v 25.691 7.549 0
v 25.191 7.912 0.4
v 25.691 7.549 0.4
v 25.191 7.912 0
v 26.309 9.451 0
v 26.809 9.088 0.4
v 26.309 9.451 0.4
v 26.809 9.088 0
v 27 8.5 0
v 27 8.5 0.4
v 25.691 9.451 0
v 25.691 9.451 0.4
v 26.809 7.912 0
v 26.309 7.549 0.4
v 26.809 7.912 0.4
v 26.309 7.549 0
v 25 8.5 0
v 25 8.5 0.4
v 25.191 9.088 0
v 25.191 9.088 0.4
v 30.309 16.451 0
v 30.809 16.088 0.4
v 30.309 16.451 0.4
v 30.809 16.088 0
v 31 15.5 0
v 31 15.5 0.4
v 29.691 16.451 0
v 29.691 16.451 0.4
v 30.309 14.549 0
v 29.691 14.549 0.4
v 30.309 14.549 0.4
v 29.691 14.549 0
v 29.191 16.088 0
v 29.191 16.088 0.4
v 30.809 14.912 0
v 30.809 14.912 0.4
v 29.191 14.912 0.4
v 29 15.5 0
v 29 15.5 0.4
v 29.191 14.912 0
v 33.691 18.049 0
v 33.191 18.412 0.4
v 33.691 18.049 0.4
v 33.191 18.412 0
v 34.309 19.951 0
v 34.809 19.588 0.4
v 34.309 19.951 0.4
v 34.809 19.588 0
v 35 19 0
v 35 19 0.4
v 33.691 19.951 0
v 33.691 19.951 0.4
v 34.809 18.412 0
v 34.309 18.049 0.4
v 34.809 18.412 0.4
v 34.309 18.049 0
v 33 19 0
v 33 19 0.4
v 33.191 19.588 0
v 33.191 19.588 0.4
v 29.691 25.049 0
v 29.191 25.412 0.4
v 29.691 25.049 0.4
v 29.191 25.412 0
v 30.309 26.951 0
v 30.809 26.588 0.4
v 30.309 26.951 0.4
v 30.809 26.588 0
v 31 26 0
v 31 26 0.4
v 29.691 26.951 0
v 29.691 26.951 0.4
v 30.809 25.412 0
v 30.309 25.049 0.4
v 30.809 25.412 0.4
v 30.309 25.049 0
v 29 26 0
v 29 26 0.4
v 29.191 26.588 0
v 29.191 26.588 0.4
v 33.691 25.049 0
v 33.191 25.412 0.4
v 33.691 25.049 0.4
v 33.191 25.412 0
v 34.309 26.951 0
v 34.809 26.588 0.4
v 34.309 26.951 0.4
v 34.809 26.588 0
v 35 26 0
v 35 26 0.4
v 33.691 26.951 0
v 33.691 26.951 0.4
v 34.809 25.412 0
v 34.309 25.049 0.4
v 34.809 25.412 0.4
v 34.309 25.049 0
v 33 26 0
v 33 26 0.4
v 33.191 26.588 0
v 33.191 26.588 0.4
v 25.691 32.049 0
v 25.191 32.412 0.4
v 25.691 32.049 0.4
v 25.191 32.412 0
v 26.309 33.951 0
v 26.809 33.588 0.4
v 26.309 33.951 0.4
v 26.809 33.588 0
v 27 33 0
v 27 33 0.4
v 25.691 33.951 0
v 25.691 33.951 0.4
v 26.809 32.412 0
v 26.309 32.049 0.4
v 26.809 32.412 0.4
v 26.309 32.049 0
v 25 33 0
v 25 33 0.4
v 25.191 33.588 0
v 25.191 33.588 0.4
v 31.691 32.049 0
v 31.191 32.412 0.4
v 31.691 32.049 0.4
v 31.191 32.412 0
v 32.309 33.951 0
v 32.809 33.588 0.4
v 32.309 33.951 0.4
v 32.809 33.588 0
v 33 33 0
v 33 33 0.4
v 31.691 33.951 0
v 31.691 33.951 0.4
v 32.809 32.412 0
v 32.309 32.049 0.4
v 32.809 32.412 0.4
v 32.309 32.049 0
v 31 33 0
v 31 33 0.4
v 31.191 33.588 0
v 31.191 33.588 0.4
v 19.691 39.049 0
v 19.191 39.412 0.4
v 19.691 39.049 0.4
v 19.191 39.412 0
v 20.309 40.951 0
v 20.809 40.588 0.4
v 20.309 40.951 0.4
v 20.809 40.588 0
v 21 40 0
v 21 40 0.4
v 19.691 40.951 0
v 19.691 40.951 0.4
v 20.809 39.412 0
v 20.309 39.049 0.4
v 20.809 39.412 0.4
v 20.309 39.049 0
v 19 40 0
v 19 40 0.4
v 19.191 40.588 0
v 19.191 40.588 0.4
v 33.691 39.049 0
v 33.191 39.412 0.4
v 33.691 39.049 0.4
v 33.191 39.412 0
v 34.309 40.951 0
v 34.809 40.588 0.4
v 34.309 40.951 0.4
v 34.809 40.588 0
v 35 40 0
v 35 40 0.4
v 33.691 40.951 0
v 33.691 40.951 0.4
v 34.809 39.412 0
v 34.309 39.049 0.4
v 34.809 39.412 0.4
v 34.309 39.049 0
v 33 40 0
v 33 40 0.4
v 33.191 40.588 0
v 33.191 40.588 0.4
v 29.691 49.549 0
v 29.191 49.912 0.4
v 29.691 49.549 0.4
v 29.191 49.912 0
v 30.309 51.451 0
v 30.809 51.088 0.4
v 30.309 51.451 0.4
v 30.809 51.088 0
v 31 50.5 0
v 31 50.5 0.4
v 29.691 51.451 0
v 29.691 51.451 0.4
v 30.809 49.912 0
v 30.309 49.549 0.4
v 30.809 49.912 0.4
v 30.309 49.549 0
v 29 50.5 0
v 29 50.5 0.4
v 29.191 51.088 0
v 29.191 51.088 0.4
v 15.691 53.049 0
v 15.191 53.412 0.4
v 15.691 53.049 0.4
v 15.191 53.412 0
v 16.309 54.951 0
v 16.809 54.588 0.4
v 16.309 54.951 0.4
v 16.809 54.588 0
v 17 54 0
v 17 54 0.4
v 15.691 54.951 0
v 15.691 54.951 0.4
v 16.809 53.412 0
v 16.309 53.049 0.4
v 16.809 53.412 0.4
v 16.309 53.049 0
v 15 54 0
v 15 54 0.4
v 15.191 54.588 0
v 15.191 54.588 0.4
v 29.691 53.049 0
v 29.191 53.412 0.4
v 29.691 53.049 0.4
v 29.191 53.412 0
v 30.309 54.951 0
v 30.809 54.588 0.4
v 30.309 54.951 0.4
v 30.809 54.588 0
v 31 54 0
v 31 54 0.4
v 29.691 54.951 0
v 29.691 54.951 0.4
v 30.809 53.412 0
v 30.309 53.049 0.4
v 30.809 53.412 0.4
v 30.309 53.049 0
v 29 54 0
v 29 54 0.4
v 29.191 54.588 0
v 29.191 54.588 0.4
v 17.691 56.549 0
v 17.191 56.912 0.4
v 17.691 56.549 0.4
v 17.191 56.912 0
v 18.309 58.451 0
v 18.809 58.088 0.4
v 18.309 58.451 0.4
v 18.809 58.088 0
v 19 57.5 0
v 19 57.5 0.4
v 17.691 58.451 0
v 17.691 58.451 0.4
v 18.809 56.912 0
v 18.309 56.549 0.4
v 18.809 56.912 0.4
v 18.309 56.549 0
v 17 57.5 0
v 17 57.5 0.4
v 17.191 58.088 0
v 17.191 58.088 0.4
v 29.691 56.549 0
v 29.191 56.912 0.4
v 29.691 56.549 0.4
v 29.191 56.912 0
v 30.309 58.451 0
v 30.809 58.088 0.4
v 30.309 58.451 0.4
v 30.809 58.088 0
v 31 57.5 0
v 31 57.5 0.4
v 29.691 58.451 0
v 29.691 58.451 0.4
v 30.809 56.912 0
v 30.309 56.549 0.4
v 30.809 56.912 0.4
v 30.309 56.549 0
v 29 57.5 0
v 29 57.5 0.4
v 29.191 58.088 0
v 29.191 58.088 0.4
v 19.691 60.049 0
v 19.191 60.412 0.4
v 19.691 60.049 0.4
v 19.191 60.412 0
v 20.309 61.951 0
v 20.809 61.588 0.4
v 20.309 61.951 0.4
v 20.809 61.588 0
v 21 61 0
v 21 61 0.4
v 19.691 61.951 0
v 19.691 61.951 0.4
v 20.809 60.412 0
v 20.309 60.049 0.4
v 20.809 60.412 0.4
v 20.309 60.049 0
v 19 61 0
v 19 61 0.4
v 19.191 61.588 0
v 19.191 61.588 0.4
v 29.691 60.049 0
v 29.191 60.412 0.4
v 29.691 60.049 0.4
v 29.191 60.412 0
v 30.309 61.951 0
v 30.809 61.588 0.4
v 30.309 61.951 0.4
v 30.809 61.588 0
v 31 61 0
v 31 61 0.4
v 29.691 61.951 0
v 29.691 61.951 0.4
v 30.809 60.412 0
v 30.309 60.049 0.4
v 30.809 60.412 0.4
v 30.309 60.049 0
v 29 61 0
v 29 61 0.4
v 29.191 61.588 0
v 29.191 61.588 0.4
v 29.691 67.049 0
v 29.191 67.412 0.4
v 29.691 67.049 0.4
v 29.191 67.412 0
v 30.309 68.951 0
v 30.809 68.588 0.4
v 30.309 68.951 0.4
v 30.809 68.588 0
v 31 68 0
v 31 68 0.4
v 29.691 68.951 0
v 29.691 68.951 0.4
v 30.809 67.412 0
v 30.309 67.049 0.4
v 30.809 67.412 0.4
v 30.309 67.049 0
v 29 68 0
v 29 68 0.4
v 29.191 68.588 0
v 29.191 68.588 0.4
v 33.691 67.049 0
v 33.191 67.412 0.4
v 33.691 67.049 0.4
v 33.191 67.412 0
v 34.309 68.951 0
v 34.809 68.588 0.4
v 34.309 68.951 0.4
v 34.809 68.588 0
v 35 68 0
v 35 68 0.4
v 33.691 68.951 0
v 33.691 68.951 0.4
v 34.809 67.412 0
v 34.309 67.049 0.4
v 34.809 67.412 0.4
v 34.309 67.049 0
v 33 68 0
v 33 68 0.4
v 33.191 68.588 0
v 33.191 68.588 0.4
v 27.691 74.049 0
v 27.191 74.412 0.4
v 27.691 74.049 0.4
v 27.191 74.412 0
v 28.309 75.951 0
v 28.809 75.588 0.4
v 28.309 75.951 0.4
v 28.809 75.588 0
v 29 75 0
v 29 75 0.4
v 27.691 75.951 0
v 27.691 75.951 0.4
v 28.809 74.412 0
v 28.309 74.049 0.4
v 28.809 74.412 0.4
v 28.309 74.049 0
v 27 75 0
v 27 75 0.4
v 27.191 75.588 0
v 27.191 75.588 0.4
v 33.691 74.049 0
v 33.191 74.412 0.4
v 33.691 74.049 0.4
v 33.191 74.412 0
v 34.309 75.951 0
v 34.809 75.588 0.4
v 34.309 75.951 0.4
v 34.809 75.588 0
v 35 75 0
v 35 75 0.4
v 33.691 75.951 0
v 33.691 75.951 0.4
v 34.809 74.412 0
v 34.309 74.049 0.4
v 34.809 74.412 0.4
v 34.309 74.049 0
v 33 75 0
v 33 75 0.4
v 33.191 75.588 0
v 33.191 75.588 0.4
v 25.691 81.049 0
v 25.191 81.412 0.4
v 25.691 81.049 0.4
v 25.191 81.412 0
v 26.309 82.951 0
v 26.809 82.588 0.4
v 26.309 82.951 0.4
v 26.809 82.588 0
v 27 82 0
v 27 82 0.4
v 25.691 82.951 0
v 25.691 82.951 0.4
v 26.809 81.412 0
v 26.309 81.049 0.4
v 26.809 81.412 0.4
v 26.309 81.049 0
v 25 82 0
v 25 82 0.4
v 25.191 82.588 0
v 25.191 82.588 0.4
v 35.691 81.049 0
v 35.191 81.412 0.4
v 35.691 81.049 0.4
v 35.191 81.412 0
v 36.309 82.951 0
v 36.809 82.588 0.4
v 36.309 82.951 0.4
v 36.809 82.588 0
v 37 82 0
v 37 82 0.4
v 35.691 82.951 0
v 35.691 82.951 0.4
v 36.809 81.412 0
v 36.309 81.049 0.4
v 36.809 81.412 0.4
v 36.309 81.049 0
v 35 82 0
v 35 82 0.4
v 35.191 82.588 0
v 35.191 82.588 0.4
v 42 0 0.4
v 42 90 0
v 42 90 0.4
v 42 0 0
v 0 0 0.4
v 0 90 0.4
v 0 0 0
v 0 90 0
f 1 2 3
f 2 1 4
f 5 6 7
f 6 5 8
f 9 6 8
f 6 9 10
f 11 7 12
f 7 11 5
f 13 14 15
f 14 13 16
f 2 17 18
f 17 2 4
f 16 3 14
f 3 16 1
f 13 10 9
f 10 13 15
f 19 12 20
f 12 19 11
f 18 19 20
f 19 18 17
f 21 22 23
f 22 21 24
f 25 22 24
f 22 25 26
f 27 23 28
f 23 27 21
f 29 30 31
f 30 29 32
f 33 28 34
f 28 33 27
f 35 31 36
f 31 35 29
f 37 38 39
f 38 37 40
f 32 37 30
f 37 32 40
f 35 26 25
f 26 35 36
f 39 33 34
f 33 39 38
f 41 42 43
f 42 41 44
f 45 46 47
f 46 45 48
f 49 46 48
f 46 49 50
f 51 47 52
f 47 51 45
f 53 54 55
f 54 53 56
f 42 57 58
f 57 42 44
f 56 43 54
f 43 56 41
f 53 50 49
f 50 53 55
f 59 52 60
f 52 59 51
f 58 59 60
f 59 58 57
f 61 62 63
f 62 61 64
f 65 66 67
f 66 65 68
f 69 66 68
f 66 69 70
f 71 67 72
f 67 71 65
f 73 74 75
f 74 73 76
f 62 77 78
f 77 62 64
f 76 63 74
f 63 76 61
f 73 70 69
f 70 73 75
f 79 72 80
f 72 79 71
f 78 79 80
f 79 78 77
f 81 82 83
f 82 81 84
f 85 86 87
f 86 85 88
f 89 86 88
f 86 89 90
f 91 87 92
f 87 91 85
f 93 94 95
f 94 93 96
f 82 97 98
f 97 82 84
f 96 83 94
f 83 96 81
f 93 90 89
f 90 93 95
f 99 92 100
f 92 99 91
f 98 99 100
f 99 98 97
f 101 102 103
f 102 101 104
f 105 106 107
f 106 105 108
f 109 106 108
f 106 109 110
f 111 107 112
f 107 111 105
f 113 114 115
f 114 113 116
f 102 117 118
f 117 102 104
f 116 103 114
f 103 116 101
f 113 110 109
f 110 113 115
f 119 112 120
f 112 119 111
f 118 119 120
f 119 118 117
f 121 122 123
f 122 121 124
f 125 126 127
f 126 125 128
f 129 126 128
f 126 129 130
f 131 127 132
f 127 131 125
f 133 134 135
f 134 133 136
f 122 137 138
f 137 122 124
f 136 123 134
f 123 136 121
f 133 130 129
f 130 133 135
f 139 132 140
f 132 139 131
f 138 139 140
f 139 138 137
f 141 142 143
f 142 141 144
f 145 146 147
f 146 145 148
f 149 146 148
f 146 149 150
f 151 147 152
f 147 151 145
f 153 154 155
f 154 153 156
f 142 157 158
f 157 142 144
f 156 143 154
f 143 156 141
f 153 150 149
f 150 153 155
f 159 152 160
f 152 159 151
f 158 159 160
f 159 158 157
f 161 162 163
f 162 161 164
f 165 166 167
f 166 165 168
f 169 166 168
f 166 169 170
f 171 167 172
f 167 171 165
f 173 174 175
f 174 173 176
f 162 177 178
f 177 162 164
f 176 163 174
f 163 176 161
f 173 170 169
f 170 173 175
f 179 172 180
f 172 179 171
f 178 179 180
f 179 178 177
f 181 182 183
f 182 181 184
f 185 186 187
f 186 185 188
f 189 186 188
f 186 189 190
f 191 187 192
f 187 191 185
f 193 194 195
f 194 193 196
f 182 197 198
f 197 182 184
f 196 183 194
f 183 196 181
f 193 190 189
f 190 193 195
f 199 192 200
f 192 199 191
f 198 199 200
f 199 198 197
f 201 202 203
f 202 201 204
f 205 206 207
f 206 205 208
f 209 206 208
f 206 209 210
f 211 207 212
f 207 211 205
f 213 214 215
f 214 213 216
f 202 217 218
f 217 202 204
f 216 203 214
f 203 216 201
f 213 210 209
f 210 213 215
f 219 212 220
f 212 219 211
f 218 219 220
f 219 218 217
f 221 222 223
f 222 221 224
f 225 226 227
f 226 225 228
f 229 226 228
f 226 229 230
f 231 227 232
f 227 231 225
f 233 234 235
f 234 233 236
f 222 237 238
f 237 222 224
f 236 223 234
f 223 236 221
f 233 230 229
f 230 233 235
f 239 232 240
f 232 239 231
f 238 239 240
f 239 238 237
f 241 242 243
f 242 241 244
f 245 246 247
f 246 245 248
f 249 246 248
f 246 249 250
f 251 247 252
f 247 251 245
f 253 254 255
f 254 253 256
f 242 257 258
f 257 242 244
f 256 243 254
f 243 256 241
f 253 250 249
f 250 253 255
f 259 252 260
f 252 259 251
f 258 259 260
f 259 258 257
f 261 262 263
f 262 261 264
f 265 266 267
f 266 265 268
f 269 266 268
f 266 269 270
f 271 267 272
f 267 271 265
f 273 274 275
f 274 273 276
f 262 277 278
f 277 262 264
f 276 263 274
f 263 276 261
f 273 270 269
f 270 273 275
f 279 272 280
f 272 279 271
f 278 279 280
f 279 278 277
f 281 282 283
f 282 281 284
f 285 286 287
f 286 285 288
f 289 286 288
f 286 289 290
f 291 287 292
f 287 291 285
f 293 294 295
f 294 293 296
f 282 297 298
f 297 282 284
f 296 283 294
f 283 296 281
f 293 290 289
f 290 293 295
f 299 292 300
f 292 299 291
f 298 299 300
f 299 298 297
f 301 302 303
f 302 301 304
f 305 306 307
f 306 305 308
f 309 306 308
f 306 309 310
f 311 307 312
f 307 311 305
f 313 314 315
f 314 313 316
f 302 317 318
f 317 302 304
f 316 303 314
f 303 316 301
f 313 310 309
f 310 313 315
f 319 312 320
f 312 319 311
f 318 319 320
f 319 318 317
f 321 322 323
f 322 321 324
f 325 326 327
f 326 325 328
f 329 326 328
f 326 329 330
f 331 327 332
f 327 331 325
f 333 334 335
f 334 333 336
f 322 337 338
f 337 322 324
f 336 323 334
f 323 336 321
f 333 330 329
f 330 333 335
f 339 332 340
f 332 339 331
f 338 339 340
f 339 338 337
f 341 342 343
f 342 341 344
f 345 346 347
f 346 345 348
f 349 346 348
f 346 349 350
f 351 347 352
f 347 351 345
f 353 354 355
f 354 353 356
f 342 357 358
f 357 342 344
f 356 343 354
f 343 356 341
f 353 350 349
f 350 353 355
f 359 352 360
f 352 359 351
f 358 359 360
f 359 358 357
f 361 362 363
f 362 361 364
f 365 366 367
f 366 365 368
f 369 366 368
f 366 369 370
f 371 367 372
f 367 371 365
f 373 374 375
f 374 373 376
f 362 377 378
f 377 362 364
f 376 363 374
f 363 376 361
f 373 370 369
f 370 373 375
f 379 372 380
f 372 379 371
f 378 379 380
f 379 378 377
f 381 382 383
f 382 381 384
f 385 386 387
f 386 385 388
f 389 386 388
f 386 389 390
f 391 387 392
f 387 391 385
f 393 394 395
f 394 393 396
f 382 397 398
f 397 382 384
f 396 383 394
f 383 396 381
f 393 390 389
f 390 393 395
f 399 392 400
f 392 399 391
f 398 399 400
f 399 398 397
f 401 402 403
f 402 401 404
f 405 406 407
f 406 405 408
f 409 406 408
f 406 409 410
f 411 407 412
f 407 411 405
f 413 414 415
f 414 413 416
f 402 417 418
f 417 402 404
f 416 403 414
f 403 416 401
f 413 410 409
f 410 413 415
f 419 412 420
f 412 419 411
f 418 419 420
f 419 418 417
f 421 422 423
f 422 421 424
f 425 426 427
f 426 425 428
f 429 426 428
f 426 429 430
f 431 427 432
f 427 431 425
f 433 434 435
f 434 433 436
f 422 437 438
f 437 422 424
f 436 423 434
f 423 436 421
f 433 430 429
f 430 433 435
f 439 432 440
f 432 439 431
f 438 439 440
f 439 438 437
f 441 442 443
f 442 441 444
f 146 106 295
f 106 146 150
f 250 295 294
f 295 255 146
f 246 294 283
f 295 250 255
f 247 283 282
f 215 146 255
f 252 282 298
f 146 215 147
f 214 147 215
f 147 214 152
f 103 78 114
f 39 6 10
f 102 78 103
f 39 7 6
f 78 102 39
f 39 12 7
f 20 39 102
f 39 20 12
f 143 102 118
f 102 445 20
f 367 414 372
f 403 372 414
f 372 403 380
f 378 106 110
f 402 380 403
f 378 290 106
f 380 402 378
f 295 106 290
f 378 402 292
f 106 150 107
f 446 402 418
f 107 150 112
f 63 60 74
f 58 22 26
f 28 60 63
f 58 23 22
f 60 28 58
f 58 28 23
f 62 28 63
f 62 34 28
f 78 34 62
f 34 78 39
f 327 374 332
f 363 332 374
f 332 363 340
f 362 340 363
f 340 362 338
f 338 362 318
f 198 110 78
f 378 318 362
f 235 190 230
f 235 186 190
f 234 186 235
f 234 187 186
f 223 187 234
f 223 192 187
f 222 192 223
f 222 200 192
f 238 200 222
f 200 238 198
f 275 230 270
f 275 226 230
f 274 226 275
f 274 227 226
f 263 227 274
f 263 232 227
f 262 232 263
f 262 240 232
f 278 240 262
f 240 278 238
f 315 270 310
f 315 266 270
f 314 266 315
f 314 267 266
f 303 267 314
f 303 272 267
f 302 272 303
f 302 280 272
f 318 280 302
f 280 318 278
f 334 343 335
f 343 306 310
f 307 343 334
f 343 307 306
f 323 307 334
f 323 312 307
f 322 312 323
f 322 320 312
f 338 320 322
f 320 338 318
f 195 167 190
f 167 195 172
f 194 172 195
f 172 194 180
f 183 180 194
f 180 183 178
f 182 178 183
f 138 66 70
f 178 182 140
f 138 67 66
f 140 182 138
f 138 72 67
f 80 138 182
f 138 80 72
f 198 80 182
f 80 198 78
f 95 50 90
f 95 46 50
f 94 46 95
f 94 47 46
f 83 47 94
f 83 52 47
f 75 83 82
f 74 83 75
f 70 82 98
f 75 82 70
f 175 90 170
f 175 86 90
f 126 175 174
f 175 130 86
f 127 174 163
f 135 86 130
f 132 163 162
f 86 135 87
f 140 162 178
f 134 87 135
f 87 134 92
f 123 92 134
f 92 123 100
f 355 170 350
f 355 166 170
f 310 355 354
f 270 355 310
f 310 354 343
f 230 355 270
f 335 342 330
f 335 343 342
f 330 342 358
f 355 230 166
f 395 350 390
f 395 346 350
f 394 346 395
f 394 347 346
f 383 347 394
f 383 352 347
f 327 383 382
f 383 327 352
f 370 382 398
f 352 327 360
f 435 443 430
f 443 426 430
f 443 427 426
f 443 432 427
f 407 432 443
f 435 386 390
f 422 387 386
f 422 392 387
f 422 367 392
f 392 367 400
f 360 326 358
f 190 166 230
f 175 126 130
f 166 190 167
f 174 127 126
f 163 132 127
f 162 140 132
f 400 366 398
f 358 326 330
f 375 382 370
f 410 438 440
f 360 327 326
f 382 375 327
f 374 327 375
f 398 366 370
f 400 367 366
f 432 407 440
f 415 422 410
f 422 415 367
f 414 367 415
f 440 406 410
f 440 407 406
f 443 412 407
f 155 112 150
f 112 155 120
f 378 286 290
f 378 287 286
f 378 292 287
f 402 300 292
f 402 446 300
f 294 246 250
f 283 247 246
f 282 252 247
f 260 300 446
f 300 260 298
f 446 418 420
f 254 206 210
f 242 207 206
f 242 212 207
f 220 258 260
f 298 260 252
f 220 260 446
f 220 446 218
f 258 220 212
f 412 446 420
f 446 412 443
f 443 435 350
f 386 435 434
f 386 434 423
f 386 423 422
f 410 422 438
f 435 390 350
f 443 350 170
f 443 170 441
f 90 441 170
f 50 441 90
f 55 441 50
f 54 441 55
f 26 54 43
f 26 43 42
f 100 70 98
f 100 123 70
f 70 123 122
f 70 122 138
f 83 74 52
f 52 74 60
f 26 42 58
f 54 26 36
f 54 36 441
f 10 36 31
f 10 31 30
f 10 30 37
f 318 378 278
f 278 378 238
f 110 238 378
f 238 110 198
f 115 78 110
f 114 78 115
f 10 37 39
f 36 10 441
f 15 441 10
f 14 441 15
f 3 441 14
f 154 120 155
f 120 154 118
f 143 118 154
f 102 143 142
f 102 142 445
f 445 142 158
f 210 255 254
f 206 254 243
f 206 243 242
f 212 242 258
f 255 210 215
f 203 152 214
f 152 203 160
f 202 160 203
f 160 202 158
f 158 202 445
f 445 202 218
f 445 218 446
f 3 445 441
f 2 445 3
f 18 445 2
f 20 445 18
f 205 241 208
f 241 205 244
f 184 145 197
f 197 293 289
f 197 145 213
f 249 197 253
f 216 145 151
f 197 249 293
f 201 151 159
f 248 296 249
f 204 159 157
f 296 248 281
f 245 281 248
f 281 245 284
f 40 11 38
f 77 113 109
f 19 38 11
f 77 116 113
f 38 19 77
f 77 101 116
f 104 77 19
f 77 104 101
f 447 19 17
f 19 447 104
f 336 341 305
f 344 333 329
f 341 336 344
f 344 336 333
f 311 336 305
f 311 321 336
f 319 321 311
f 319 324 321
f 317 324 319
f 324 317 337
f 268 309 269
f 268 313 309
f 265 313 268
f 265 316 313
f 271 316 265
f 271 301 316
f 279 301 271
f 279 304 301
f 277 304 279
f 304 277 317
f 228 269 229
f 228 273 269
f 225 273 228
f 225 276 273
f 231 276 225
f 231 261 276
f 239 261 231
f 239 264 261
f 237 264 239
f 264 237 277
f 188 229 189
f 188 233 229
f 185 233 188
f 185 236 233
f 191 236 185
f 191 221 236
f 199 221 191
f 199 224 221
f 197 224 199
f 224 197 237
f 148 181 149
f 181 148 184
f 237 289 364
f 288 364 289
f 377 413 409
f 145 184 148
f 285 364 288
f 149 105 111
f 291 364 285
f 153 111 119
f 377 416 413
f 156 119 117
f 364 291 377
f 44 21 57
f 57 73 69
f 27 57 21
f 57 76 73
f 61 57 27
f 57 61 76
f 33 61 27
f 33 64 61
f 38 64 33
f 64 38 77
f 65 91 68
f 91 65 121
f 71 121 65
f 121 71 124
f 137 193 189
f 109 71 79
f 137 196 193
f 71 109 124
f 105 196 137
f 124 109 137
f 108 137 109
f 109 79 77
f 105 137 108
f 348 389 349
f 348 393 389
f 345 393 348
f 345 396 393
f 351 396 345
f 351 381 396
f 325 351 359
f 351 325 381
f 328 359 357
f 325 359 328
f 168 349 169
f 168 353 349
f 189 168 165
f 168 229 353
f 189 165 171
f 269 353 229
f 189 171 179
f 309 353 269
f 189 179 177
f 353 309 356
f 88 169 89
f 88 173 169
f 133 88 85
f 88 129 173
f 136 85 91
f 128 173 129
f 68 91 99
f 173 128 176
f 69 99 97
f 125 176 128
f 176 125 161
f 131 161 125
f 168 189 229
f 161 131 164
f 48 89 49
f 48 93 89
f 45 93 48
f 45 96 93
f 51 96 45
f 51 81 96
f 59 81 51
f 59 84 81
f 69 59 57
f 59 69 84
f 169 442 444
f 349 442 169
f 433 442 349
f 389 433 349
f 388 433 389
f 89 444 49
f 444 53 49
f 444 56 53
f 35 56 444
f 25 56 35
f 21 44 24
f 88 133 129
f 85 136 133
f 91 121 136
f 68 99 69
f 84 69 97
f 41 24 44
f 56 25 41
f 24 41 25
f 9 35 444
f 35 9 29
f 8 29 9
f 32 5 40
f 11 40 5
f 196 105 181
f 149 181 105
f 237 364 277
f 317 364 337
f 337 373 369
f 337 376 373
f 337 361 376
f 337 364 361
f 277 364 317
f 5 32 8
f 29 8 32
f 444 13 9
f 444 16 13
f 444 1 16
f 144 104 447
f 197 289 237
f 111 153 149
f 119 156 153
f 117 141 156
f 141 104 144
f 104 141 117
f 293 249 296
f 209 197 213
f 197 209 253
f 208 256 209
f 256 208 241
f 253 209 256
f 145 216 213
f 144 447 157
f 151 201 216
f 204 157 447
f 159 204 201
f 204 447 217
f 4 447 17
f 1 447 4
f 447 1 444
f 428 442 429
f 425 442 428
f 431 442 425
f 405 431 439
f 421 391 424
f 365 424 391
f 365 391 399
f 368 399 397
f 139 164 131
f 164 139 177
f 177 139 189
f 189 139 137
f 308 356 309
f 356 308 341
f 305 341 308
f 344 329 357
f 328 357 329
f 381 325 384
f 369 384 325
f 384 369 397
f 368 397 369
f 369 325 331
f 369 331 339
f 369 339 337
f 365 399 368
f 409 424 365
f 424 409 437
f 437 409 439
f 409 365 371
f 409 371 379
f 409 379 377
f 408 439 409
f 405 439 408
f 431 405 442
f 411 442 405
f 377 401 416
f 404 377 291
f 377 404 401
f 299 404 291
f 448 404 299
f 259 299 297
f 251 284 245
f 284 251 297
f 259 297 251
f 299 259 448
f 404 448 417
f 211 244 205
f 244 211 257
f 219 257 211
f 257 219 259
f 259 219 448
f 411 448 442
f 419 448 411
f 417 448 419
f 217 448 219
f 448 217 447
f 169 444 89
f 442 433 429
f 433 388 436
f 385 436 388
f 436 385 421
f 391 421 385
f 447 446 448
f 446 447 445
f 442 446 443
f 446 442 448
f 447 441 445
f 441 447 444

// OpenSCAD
// [FL_INDEX: keywords="openscad, 3d_parametric, DIY_melody_strips_creator, csg_solid" | COT="Parametric OpenSCAD design from 3DCodeverse"]
// Title: DIY melody strips creator

$fn=10*1;  //More polygons

//Defines whether a pre-defined song or the NoteString shall be used.
SongPicker = "Star-Spangled Banner"; // [Note-String,Star-Spangled Banner]

//Defines where to set the holes for the notes. You have the notes c1 to c3. The first two characters define the note (c1,d1,e1...b1,c2,...c3), the last two characters define the beat. You have 50 beats to use. After every note-definition place a |. One c1 on the third beat would result in this NoteString: "c103|". Don't forget the | at the end!
NoteString = "c101|d102|e103|f104|g105|a106|b107|c208|d209|e210|f211|g212|a213|b214|c315|";

//The layer-thickness must not be more then 0.4mm. Otherwise it won't fit into the music box! Also try to print at least two layers - so slice it with a layer height of 0.2mm.
LayerThickness = 0.4;

//Defines the width of the stripe (in mm).
StripeWidth = 42; // [30:50]

//Defines the length of the stripe. 15 beats need a length around 60mm. The full 50 beats would need 200mm.
StripeLength = 90;// [10:200]

//For fine-tuning only: defines how far the c1 is away from the left stripe-border (in mm).
MarginLeft = 5; // [2:10]

//For fine-tuning only: defines the distance between the beats.
BeatDistance = 3.5;

//For fine-tuning only: defines the distance between the beats.
ToneDistance = 2;

Start( );

module Start()
{
NoteString_AmericanAnthem = "a101|f103|d104|f106|d106|a108|e108|d210|d110|f113|f214|f114|e215|f115|d216|f116|f118|d118|g120|d120|a122|c122|";

if( SongPicker == "Star-Spangled Banner")
	BuildStripe(NoteString_AmericanAnthem);
else if (SongPicker == "Note-String")
	BuildStripe(NoteString);
}

module BuildStripe(NoteStringLocal){
	takte=search("|",NoteStringLocal,1000)[0];
	difference()
	{
		BuildBase();
		for(i=[0:len(takte)-1])
		{
			printNote(str(NoteStringLocal[takte[i]-2],NoteStringLocal[takte[i]-1]), str(NoteStringLocal[takte[i]-4],NoteStringLocal[takte[i]-3]));
		}
	}
}

module printNote(takt,note)
{
	//I did not find a way to convert the string "01" into the number 1.
	//So there is this ugly convertion, I'm sorry. ;)
	if (takt == "01")
		printNote2(1,note);
	else if (takt == "02")
		printNote2(2,note);
	else if (takt == "03")
		printNote2(3,note);
	else if (takt == "04")
		printNote2(4,note);
	else if (takt == "05")
		printNote2(5,note);
	else if (takt == "06")
		printNote2(6,note);
	else if (takt == "07")
		printNote2(7,note);
	else if (takt == "08")
		printNote2(8,note);
	else if (takt == "09")
		printNote2(9,note);
	else if (takt == "10")
		printNote2(10,note);
	else if (takt == "11")
		printNote2(11,note);
	else if (takt == "12")
		printNote2(12,note);
	else if (takt == "13")
		printNote2(13,note);
	else if (takt == "14")
		printNote2(14,note);
	else if (takt == "15")
		printNote2(15,note);
	else if (takt == "16")
		printNote2(16,note);
	else if (takt == "17")
		printNote2(17,note);
	else if (takt == "18")
		printNote2(18,note);
	else if (takt == "19")
		printNote2(19,note);
	else if (takt == "20")
		printNote2(20,note);
	else if (takt == "21")
		printNote2(21,note);
	else if (takt == "22")
		printNote2(22,note);
	else if (takt == "23")
		printNote2(23,note);
	else if (takt == "24")
		printNote2(24,note);
	else if (takt == "25")
		printNote2(25,note);
	else if (takt == "26")
		printNote2(26,note);
	else if (takt == "27")
		printNote2(27,note);
	else if (takt == "28")
		printNote2(28,note);
	else if (takt == "29")
		printNote2(29,note);
	else if (takt == "30")
		printNote2(30,note);
	else if (takt == "31")
		printNote2(31,note);
	else if (takt == "32")
		printNote2(32,note);
	else if (takt == "33")
		printNote2(33,note);
	else if (takt == "34")
		printNote2(34,note);
	else if (takt == "35")
		printNote2(35,note);
	else if (takt == "36")
		printNote2(36,note);
	else if (takt == "37")
		printNote2(37,note);
	else if (takt == "38")
		printNote2(38,note);
	else if (takt == "39")
		printNote2(39,note);
	else if (takt == "40")
		printNote2(40,note);
	else if (takt == "41")
		printNote2(41,note);
	else if (takt == "42")
		printNote2(42,note);
	else if (takt == "43")
		printNote2(43,note);
	else if (takt == "44")
		printNote2(44,note);
	else if (takt == "45")
		printNote2(45,note);
	else if (takt == "46")
		printNote2(46,note);
	else if (takt == "47")
		printNote2(47,note);
	else if (takt == "48")
		printNote2(48,note);
	else if (takt == "49")
		printNote2(49,note);
	else if (takt == "50")
		printNote2(50,note);
	else
		printNote2(10,note);
}

module printNote2(takt,note)
{
	if (note == "c1")
		MakeHole(takt,1);
	else if (note == "d1")
		MakeHole(takt,2);
	else if (note == "e1")
		MakeHole(takt,3);
	else if (note == "f1")
		MakeHole(takt,4);
	else if (note == "g1")
		MakeHole(takt,5);
	else if (note == "a1")
		MakeHole(takt,6);
	else if (note == "b1") //h
		MakeHole(takt,7);
	else if (note == "c2")
		MakeHole(takt,8);
	else if (note == "d2")
		MakeHole(takt,9);
	else if (note == "e2")
		MakeHole(takt,10);
	else if (note == "f2")
		MakeHole(takt,11);
	else if (note == "g2")
		MakeHole(takt,12);
	else if (note == "a2")
		MakeHole(takt,13);
	else if (note == "b2") //h
		MakeHole(takt,14);
	else if (note == "c3")
		MakeHole(takt,15);
}

module BuildBase(){
	cube([StripeWidth,StripeLength,LayerThickness]);
}

module MakeHole(beatNumber,pitchNumber){
	Y = MarginLeft + (beatNumber * BeatDistance);
	X = StripeWidth - MarginLeft - (pitchNumber * ToneDistance) + 1;

	translate([X,Y,-1]) cylinder(h=LayerThickness*20,r=1);
}
